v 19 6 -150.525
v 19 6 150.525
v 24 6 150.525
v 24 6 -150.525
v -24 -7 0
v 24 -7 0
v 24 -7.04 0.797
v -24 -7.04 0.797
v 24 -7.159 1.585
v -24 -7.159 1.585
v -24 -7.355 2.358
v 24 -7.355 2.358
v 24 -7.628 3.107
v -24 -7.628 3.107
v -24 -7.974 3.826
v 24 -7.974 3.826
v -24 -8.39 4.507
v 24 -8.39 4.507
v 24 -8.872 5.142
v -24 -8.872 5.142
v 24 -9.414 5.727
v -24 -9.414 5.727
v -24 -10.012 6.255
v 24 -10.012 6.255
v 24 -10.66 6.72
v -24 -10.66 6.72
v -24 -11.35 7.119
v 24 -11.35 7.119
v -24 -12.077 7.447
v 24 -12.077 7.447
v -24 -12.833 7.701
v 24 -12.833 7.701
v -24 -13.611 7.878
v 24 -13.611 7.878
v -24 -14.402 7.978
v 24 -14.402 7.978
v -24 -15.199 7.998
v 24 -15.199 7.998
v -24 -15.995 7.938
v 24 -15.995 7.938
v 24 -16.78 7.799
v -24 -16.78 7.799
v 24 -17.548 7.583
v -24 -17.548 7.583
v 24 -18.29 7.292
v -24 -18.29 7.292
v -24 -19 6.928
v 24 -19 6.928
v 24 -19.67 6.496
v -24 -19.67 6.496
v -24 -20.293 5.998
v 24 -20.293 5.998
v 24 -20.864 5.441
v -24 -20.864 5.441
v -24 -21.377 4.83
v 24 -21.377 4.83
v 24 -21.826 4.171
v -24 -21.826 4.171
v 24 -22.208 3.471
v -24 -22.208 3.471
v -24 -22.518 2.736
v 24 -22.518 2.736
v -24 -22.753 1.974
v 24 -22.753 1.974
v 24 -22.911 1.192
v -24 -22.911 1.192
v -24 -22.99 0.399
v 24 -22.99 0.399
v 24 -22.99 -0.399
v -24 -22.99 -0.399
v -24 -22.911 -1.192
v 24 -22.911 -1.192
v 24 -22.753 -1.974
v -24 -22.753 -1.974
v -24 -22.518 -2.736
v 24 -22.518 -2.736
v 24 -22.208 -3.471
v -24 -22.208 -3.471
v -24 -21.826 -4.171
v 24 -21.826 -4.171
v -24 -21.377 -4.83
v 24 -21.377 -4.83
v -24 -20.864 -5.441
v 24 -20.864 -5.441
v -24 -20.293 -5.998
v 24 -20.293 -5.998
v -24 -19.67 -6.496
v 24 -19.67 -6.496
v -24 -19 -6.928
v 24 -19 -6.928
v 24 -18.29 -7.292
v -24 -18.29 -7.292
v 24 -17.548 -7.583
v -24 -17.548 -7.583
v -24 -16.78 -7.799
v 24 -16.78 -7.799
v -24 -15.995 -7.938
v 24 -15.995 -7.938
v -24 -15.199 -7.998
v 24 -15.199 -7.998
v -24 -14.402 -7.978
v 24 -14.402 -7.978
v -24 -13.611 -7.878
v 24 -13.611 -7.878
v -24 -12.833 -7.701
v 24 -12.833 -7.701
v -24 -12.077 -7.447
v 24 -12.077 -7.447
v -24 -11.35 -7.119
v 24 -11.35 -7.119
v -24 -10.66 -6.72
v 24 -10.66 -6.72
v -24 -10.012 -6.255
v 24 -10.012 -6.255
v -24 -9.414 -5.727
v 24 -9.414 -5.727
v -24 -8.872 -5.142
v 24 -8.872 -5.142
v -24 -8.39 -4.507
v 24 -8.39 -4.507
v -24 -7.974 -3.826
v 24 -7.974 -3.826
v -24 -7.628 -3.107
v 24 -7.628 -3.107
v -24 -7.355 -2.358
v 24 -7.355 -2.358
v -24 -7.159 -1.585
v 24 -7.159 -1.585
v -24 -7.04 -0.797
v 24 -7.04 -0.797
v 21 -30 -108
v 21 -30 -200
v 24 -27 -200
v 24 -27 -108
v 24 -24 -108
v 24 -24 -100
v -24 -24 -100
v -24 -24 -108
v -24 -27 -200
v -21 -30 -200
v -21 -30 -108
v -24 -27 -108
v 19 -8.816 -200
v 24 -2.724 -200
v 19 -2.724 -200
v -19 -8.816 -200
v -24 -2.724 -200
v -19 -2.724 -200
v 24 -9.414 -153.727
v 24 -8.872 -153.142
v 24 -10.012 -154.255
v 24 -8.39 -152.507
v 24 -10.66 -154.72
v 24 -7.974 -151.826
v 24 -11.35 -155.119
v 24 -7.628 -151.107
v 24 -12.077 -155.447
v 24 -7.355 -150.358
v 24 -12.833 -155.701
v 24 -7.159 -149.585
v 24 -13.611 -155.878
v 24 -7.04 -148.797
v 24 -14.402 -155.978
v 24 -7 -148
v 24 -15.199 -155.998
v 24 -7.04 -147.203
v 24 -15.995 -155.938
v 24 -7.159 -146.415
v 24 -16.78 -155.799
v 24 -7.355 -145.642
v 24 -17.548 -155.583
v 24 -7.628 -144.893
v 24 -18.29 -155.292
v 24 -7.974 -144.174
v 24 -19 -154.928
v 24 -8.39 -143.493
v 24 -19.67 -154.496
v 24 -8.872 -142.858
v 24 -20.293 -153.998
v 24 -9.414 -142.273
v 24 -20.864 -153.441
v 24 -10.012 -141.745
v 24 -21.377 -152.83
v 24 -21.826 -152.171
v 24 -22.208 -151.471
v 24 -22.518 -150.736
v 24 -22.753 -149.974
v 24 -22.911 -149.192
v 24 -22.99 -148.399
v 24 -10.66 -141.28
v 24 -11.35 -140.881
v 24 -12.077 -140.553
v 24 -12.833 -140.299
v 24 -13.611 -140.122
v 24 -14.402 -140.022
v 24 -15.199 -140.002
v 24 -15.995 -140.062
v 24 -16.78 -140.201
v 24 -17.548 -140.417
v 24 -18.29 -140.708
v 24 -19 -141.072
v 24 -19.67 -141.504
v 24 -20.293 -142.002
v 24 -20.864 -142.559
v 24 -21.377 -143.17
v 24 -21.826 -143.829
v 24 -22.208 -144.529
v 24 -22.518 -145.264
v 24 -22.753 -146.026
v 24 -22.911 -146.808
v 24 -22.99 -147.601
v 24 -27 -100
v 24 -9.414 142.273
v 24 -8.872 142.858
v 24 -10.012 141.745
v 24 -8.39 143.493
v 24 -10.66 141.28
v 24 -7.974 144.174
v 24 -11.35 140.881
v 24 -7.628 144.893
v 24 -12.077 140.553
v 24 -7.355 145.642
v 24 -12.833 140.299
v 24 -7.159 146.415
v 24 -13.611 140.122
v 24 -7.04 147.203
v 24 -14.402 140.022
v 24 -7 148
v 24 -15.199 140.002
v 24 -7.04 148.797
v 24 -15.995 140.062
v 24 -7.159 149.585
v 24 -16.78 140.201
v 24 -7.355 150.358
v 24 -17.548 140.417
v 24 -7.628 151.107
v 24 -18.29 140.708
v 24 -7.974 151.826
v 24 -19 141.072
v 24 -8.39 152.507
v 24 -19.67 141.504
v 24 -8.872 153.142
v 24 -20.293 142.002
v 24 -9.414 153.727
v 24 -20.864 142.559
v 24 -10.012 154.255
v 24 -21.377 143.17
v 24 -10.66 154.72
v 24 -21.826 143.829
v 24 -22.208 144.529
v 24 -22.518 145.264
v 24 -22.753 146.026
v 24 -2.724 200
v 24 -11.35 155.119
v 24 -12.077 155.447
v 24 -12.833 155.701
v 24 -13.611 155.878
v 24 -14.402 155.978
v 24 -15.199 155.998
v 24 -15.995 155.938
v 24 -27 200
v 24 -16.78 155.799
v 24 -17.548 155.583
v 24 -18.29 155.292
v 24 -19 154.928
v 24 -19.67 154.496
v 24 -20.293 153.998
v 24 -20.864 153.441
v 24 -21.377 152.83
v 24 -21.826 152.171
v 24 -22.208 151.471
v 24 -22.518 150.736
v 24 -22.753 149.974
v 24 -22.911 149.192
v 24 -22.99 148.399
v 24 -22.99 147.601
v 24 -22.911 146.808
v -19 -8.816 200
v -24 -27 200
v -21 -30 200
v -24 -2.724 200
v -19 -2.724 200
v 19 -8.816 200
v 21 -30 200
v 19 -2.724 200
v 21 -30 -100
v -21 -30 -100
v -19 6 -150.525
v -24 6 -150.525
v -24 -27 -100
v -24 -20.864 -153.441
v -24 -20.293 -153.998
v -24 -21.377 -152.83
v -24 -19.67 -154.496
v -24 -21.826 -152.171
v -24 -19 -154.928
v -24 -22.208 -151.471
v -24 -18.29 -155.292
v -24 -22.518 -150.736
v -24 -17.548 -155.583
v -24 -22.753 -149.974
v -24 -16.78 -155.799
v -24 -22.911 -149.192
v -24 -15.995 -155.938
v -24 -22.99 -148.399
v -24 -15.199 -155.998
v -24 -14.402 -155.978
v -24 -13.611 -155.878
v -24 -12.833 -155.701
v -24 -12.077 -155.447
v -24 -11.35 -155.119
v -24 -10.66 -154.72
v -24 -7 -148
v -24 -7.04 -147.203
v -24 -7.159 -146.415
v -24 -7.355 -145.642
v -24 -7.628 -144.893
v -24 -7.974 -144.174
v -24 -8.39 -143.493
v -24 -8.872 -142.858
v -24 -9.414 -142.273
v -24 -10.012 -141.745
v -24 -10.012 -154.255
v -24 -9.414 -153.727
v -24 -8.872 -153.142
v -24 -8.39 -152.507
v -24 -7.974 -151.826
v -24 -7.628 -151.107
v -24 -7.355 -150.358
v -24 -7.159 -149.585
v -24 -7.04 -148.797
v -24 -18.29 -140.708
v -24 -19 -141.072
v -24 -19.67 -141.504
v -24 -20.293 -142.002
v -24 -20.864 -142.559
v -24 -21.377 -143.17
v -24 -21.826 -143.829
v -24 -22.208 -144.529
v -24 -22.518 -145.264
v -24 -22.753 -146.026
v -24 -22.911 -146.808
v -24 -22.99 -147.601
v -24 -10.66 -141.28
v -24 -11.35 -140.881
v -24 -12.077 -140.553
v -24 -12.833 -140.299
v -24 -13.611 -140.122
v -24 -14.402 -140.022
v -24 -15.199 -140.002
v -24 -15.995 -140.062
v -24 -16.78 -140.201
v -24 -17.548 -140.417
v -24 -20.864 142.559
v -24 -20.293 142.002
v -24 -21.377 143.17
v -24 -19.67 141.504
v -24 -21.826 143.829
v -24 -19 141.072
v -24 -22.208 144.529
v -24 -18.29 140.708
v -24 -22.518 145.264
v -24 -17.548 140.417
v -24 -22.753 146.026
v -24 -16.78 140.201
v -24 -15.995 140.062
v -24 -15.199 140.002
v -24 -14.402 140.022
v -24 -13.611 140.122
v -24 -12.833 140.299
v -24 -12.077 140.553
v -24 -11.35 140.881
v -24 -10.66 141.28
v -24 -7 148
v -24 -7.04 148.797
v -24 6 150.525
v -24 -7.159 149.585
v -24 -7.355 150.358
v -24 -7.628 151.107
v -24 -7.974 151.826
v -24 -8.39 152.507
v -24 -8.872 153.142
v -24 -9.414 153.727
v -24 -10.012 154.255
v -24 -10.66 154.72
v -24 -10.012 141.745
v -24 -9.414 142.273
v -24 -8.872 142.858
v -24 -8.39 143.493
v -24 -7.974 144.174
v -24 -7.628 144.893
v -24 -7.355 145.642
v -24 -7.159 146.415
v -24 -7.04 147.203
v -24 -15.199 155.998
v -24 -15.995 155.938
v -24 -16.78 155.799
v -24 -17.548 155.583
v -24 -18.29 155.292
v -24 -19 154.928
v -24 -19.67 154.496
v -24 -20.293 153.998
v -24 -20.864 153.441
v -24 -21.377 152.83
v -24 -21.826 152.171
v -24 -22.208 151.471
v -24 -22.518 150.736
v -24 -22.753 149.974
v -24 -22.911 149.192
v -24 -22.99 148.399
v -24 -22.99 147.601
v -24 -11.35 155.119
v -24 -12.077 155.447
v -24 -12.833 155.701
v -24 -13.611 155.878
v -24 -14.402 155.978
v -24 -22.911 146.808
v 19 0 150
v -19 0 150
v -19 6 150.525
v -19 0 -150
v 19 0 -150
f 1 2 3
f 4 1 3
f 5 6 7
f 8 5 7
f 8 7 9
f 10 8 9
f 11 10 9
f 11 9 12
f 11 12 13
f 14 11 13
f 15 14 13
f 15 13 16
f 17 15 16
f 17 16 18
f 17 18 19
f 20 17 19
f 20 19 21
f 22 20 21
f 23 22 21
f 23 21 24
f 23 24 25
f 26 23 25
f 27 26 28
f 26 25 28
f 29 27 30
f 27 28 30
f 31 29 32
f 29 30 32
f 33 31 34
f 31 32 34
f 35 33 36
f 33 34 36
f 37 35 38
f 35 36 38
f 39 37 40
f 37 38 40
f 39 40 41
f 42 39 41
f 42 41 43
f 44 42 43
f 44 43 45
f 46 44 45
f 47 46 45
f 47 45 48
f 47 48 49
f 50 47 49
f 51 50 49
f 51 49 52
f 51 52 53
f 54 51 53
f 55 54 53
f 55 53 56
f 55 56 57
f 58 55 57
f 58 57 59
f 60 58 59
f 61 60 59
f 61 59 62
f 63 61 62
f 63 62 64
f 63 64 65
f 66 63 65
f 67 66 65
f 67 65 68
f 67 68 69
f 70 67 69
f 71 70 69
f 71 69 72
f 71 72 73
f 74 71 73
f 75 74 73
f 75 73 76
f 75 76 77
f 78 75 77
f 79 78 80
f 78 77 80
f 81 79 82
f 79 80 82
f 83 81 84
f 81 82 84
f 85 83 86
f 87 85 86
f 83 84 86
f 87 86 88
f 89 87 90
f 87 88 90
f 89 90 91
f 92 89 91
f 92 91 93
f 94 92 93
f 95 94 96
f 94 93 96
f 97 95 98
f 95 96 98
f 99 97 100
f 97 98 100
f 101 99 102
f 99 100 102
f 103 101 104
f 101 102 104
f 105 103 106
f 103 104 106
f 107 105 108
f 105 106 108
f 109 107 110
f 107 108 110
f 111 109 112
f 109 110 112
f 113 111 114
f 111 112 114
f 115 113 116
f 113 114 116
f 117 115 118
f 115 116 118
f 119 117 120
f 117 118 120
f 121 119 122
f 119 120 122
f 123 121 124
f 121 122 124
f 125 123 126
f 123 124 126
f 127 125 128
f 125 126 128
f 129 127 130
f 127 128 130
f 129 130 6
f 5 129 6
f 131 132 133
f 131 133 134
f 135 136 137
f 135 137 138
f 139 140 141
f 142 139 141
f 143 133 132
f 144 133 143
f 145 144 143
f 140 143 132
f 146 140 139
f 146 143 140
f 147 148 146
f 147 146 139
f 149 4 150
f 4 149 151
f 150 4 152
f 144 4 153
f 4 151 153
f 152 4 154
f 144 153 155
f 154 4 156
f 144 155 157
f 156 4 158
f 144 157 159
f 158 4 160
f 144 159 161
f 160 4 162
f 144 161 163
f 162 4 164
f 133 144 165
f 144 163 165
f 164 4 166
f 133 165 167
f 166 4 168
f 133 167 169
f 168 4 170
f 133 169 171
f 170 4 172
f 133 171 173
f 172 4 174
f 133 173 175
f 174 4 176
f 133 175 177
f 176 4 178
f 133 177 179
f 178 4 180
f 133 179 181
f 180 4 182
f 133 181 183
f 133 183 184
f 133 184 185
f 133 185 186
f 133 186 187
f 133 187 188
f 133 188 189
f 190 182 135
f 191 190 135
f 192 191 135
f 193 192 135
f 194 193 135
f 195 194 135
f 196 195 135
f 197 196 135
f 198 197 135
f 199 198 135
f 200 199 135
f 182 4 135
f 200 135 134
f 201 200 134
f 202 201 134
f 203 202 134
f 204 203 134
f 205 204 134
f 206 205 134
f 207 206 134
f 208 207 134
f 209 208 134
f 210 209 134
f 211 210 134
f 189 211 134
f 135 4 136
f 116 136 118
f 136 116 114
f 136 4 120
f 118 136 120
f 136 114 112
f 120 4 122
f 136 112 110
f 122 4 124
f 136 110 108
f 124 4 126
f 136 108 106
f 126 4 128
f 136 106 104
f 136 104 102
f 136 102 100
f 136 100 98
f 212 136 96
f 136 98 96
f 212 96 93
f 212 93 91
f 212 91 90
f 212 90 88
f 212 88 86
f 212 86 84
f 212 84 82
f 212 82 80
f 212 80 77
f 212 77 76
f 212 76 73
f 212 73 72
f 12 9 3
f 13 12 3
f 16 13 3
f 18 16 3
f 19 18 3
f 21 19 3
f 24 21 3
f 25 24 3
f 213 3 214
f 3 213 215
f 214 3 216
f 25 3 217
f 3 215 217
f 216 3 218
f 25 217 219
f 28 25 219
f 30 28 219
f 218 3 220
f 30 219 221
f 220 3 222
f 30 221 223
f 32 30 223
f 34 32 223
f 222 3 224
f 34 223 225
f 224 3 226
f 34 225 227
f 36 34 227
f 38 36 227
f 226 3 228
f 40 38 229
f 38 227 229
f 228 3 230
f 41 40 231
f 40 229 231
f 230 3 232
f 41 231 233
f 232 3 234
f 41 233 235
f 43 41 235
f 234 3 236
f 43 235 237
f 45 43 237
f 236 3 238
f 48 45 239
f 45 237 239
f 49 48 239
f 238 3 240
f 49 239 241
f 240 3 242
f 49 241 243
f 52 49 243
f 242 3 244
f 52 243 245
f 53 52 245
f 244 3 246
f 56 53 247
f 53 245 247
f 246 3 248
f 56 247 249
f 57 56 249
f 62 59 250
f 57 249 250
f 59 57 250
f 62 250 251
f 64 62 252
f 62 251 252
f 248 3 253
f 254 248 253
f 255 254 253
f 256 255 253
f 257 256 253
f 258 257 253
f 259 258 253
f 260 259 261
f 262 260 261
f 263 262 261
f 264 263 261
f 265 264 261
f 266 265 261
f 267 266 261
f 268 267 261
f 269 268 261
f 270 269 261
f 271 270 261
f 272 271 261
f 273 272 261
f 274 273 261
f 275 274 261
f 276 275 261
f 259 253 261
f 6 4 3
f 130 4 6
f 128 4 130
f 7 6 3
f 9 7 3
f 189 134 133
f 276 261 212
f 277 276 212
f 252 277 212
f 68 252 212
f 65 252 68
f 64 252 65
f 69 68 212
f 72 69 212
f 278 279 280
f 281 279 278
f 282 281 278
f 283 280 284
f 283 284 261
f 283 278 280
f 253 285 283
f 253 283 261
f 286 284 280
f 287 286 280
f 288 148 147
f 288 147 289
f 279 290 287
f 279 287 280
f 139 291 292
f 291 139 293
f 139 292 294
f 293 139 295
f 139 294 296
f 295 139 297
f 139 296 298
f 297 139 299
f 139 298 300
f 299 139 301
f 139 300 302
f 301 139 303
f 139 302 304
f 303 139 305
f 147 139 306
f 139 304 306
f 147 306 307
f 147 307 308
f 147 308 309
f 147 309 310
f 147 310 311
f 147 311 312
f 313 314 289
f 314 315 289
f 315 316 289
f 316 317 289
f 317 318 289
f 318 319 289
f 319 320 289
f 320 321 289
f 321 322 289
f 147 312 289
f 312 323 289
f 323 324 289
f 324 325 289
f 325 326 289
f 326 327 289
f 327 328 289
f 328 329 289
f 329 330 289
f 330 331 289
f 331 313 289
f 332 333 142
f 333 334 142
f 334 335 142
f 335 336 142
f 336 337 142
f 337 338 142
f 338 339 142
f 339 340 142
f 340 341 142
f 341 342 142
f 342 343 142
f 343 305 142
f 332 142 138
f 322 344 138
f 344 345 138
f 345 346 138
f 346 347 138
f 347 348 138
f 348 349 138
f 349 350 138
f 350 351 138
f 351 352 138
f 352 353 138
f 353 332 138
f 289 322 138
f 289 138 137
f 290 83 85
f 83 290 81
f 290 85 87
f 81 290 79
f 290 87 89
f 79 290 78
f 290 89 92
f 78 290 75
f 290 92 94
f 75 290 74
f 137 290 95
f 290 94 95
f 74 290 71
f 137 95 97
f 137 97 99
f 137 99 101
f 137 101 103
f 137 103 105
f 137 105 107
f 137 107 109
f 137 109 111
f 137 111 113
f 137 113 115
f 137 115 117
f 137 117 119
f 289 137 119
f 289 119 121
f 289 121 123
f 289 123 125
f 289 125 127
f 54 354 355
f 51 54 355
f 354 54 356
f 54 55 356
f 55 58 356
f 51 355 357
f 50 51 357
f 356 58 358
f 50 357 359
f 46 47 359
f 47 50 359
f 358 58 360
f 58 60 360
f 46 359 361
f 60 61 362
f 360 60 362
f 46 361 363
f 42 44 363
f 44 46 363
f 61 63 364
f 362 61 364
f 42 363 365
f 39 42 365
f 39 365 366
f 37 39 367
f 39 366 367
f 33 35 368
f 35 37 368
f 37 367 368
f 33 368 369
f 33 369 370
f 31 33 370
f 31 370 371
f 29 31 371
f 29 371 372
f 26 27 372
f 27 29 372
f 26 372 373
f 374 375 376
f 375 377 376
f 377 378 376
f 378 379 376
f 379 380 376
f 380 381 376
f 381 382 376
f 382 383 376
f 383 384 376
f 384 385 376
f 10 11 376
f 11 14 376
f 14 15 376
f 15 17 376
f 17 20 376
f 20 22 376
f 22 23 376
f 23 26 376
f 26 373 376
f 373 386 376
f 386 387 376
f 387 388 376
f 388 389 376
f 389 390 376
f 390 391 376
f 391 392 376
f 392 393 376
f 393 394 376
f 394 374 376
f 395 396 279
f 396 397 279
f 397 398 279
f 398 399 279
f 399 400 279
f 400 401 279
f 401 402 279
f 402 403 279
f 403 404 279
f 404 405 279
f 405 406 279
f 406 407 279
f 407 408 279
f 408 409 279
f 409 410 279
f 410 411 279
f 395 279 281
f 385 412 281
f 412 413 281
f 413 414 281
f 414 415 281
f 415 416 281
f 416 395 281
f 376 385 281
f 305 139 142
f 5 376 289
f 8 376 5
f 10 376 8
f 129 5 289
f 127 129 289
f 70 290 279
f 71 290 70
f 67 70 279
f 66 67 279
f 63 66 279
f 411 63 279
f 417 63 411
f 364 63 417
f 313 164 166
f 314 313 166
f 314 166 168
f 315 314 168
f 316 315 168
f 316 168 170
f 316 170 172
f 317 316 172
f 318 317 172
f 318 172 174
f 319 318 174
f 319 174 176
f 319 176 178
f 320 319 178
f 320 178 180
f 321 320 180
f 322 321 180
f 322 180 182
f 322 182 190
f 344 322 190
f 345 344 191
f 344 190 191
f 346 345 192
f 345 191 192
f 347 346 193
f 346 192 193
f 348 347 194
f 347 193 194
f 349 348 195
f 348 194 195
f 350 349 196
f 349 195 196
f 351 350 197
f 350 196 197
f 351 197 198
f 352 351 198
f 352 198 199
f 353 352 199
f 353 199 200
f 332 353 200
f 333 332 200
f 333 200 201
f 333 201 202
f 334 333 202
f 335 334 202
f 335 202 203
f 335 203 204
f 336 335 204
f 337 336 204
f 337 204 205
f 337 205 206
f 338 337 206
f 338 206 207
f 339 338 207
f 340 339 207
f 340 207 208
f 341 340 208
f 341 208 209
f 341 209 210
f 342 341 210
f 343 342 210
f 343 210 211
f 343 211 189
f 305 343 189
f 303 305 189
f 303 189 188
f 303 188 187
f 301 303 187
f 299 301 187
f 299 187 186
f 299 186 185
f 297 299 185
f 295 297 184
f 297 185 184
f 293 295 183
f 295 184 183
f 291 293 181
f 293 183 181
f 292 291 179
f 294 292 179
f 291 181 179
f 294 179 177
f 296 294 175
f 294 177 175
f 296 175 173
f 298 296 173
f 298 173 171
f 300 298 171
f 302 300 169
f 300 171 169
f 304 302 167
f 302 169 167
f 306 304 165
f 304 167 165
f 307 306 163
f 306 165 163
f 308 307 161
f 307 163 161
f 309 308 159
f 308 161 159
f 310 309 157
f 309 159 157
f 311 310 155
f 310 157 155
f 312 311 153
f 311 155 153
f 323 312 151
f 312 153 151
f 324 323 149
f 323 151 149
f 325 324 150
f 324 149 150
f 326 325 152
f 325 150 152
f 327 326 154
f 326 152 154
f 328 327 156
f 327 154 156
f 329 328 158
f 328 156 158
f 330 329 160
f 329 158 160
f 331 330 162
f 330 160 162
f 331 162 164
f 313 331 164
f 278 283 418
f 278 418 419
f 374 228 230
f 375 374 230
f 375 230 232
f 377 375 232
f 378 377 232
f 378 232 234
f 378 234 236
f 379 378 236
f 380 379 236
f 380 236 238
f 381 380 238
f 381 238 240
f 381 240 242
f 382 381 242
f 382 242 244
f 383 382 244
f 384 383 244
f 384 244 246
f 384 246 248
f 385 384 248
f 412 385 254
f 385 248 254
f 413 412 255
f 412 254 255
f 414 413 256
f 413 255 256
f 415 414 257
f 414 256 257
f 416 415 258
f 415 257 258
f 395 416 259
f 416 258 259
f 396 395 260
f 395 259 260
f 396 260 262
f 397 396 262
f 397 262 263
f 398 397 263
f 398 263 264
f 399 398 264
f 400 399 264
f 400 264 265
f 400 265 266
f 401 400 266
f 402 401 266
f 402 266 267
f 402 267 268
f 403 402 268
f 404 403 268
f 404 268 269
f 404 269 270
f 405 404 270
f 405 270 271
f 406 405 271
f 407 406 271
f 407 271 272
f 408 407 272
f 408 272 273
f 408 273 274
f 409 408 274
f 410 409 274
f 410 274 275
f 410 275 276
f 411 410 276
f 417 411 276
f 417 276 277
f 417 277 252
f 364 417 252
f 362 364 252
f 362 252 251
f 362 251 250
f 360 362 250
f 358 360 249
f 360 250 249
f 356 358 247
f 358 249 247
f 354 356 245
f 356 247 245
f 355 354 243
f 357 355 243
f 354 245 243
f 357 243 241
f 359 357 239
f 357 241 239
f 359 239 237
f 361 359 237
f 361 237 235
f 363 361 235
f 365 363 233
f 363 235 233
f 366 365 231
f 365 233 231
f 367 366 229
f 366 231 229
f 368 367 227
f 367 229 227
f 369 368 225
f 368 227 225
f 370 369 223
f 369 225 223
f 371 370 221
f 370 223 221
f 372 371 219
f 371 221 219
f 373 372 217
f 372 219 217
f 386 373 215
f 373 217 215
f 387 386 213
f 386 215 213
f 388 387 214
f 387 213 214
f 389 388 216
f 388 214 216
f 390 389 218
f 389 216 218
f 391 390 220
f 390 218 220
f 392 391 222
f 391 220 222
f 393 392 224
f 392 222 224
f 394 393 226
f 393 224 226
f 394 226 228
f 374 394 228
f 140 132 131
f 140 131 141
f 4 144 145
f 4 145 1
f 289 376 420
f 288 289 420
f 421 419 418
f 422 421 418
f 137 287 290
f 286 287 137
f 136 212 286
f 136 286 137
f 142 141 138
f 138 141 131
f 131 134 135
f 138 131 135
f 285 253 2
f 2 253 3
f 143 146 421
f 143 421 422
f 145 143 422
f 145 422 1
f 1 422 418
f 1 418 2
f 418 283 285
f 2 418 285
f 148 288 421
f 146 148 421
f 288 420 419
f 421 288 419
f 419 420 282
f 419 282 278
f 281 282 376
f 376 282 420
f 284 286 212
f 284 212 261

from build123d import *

# Parameters (mm, degrees)
RESSALTO_EXTRUS_O1_DEPTH = 178
ESBO_O2_R                = 8
CORTE_EXTRUS_O1_DEPTH    = 655
RESSALTO_EXTRUS_O2_DEPTH = 22
RESSALTO_EXTRUS_O3_DEPTH = 22
ESBO_O5_W                = 8
ESBO_O5_H                = 32.976988492
CORTE_EXTRUS_O2_DEPTH    = 89
CHANFRO1_SIZE            = 50
CHANFRO1_SIZE2           = 8.816349035
CORTE_EXTRUS_O3_DEPTH    = 108
CHANFRO2_SIZE            = 3
ESBO_O7_R                = 8
CORTE_EXTRUS_O4_DEPTH    = 89


with BuildPart() as part:
    # Esboço1 → Ressalto-extrusão1 (new, symmetric)
    with BuildSketch(Plane.XY):
        Polygon((-19, 0), (19, 0), (19, 6), (24, 6), (24, -30), (-24, -30), (-24, 6), (-19, 6), align=None)
    extrude(amount=RESSALTO_EXTRUS_O1_DEPTH, both=True)

    # Esboço2 → Corte-extrusão1 (cut)
    with BuildSketch(Plane(origin=(24, 0, 0), x_dir=(0, 0, -1), z_dir=(1, 0, 0))):
        with Locations(Location((-148, -15, 0), (0, 0, 90))):
            Circle(ESBO_O2_R)
        with Locations(Location((148, -15, 0), (0, 0, 90))):
            Circle(ESBO_O2_R)
    extrude(amount=-CORTE_EXTRUS_O1_DEPTH, mode=Mode.SUBTRACT)

    # Esboço3 → Ressalto-extrusão2 (add)
    with BuildSketch(Plane.XY.offset(178)):
        Polygon((-24, 6), (-24, -30), (24, -30), (24, 6), (19, 6), (19, 0), (-19, 0), (-19, 6), align=None)
    extrude(amount=RESSALTO_EXTRUS_O2_DEPTH)

    # Esboço4 → Ressalto-extrusão3 (add)
    with BuildSketch(Plane(origin=(0, 0, -178), x_dir=(-1, 0, 0), z_dir=(0, 0, -1))):
        Polygon((24, -30), (24, 6), (19, 6), (19, 0), (-19, 0), (-19, 6), (-24, 6), (-24, -30), align=None)
    extrude(amount=RESSALTO_EXTRUS_O3_DEPTH)

    # Esboço5 → Corte-extrusão2 (cut)
    with BuildSketch(Plane(origin=(24, 0, 0), x_dir=(0, 0, -1), z_dir=(1, 0, 0))):
        with Locations((104, -40.488494246)):
            Rectangle(ESBO_O5_W, ESBO_O5_H)
    extrude(amount=-CORTE_EXTRUS_O2_DEPTH, mode=Mode.SUBTRACT)

    # Chanfro1
    chanfro1_edges = [part.edges().sort_by_distance(p)[0] for p in [
        (0, 0, 200),
        (0, 0, -200),
    ]]
    chanfro1_side = [part.faces().sort_by_distance(p)[0] for p in [
        (0, 0, 0),
    ]]
    chamfer(chanfro1_edges, length=CHANFRO1_SIZE, length2=CHANFRO1_SIZE2, reference=chanfro1_side[0])

    # Esboço6 → Corte-extrusão3 (cut)
    with BuildSketch(Plane(origin=(24, 0, 0), x_dir=(0, 0, -1), z_dir=(1, 0, 0))):
        Polygon((-135.211980872, 8.700086435), (-200, 6), (-201.041889066, -2.907502517), align=None)
        Polygon((200, 6), (201.041889066, -2.907502517), (135.211980872, 8.700086435), align=None)
    extrude(amount=-CORTE_EXTRUS_O3_DEPTH, mode=Mode.SUBTRACT)

    # Chanfro2
    chanfro2_edges = [part.edges().sort_by_distance(p)[0] for p in [
        (24, -30, 50),
        (-24, -30, 50),
        (24, -30, -154),
        (-24, -30, -154),
    ]]
    chamfer(chanfro2_edges, length=CHANFRO2_SIZE)

    # Esboço7 → Corte-extrusão4 (cut)
    with BuildSketch(Plane(origin=(24, 0, 0), x_dir=(0, 0, -1), z_dir=(1, 0, 0))):
        with Locations(Location((0, -15, 0), (0, 0, 90))):
            Circle(ESBO_O7_R)
    extrude(amount=-CORTE_EXTRUS_O4_DEPTH, mode=Mode.SUBTRACT)


solid = part.part
